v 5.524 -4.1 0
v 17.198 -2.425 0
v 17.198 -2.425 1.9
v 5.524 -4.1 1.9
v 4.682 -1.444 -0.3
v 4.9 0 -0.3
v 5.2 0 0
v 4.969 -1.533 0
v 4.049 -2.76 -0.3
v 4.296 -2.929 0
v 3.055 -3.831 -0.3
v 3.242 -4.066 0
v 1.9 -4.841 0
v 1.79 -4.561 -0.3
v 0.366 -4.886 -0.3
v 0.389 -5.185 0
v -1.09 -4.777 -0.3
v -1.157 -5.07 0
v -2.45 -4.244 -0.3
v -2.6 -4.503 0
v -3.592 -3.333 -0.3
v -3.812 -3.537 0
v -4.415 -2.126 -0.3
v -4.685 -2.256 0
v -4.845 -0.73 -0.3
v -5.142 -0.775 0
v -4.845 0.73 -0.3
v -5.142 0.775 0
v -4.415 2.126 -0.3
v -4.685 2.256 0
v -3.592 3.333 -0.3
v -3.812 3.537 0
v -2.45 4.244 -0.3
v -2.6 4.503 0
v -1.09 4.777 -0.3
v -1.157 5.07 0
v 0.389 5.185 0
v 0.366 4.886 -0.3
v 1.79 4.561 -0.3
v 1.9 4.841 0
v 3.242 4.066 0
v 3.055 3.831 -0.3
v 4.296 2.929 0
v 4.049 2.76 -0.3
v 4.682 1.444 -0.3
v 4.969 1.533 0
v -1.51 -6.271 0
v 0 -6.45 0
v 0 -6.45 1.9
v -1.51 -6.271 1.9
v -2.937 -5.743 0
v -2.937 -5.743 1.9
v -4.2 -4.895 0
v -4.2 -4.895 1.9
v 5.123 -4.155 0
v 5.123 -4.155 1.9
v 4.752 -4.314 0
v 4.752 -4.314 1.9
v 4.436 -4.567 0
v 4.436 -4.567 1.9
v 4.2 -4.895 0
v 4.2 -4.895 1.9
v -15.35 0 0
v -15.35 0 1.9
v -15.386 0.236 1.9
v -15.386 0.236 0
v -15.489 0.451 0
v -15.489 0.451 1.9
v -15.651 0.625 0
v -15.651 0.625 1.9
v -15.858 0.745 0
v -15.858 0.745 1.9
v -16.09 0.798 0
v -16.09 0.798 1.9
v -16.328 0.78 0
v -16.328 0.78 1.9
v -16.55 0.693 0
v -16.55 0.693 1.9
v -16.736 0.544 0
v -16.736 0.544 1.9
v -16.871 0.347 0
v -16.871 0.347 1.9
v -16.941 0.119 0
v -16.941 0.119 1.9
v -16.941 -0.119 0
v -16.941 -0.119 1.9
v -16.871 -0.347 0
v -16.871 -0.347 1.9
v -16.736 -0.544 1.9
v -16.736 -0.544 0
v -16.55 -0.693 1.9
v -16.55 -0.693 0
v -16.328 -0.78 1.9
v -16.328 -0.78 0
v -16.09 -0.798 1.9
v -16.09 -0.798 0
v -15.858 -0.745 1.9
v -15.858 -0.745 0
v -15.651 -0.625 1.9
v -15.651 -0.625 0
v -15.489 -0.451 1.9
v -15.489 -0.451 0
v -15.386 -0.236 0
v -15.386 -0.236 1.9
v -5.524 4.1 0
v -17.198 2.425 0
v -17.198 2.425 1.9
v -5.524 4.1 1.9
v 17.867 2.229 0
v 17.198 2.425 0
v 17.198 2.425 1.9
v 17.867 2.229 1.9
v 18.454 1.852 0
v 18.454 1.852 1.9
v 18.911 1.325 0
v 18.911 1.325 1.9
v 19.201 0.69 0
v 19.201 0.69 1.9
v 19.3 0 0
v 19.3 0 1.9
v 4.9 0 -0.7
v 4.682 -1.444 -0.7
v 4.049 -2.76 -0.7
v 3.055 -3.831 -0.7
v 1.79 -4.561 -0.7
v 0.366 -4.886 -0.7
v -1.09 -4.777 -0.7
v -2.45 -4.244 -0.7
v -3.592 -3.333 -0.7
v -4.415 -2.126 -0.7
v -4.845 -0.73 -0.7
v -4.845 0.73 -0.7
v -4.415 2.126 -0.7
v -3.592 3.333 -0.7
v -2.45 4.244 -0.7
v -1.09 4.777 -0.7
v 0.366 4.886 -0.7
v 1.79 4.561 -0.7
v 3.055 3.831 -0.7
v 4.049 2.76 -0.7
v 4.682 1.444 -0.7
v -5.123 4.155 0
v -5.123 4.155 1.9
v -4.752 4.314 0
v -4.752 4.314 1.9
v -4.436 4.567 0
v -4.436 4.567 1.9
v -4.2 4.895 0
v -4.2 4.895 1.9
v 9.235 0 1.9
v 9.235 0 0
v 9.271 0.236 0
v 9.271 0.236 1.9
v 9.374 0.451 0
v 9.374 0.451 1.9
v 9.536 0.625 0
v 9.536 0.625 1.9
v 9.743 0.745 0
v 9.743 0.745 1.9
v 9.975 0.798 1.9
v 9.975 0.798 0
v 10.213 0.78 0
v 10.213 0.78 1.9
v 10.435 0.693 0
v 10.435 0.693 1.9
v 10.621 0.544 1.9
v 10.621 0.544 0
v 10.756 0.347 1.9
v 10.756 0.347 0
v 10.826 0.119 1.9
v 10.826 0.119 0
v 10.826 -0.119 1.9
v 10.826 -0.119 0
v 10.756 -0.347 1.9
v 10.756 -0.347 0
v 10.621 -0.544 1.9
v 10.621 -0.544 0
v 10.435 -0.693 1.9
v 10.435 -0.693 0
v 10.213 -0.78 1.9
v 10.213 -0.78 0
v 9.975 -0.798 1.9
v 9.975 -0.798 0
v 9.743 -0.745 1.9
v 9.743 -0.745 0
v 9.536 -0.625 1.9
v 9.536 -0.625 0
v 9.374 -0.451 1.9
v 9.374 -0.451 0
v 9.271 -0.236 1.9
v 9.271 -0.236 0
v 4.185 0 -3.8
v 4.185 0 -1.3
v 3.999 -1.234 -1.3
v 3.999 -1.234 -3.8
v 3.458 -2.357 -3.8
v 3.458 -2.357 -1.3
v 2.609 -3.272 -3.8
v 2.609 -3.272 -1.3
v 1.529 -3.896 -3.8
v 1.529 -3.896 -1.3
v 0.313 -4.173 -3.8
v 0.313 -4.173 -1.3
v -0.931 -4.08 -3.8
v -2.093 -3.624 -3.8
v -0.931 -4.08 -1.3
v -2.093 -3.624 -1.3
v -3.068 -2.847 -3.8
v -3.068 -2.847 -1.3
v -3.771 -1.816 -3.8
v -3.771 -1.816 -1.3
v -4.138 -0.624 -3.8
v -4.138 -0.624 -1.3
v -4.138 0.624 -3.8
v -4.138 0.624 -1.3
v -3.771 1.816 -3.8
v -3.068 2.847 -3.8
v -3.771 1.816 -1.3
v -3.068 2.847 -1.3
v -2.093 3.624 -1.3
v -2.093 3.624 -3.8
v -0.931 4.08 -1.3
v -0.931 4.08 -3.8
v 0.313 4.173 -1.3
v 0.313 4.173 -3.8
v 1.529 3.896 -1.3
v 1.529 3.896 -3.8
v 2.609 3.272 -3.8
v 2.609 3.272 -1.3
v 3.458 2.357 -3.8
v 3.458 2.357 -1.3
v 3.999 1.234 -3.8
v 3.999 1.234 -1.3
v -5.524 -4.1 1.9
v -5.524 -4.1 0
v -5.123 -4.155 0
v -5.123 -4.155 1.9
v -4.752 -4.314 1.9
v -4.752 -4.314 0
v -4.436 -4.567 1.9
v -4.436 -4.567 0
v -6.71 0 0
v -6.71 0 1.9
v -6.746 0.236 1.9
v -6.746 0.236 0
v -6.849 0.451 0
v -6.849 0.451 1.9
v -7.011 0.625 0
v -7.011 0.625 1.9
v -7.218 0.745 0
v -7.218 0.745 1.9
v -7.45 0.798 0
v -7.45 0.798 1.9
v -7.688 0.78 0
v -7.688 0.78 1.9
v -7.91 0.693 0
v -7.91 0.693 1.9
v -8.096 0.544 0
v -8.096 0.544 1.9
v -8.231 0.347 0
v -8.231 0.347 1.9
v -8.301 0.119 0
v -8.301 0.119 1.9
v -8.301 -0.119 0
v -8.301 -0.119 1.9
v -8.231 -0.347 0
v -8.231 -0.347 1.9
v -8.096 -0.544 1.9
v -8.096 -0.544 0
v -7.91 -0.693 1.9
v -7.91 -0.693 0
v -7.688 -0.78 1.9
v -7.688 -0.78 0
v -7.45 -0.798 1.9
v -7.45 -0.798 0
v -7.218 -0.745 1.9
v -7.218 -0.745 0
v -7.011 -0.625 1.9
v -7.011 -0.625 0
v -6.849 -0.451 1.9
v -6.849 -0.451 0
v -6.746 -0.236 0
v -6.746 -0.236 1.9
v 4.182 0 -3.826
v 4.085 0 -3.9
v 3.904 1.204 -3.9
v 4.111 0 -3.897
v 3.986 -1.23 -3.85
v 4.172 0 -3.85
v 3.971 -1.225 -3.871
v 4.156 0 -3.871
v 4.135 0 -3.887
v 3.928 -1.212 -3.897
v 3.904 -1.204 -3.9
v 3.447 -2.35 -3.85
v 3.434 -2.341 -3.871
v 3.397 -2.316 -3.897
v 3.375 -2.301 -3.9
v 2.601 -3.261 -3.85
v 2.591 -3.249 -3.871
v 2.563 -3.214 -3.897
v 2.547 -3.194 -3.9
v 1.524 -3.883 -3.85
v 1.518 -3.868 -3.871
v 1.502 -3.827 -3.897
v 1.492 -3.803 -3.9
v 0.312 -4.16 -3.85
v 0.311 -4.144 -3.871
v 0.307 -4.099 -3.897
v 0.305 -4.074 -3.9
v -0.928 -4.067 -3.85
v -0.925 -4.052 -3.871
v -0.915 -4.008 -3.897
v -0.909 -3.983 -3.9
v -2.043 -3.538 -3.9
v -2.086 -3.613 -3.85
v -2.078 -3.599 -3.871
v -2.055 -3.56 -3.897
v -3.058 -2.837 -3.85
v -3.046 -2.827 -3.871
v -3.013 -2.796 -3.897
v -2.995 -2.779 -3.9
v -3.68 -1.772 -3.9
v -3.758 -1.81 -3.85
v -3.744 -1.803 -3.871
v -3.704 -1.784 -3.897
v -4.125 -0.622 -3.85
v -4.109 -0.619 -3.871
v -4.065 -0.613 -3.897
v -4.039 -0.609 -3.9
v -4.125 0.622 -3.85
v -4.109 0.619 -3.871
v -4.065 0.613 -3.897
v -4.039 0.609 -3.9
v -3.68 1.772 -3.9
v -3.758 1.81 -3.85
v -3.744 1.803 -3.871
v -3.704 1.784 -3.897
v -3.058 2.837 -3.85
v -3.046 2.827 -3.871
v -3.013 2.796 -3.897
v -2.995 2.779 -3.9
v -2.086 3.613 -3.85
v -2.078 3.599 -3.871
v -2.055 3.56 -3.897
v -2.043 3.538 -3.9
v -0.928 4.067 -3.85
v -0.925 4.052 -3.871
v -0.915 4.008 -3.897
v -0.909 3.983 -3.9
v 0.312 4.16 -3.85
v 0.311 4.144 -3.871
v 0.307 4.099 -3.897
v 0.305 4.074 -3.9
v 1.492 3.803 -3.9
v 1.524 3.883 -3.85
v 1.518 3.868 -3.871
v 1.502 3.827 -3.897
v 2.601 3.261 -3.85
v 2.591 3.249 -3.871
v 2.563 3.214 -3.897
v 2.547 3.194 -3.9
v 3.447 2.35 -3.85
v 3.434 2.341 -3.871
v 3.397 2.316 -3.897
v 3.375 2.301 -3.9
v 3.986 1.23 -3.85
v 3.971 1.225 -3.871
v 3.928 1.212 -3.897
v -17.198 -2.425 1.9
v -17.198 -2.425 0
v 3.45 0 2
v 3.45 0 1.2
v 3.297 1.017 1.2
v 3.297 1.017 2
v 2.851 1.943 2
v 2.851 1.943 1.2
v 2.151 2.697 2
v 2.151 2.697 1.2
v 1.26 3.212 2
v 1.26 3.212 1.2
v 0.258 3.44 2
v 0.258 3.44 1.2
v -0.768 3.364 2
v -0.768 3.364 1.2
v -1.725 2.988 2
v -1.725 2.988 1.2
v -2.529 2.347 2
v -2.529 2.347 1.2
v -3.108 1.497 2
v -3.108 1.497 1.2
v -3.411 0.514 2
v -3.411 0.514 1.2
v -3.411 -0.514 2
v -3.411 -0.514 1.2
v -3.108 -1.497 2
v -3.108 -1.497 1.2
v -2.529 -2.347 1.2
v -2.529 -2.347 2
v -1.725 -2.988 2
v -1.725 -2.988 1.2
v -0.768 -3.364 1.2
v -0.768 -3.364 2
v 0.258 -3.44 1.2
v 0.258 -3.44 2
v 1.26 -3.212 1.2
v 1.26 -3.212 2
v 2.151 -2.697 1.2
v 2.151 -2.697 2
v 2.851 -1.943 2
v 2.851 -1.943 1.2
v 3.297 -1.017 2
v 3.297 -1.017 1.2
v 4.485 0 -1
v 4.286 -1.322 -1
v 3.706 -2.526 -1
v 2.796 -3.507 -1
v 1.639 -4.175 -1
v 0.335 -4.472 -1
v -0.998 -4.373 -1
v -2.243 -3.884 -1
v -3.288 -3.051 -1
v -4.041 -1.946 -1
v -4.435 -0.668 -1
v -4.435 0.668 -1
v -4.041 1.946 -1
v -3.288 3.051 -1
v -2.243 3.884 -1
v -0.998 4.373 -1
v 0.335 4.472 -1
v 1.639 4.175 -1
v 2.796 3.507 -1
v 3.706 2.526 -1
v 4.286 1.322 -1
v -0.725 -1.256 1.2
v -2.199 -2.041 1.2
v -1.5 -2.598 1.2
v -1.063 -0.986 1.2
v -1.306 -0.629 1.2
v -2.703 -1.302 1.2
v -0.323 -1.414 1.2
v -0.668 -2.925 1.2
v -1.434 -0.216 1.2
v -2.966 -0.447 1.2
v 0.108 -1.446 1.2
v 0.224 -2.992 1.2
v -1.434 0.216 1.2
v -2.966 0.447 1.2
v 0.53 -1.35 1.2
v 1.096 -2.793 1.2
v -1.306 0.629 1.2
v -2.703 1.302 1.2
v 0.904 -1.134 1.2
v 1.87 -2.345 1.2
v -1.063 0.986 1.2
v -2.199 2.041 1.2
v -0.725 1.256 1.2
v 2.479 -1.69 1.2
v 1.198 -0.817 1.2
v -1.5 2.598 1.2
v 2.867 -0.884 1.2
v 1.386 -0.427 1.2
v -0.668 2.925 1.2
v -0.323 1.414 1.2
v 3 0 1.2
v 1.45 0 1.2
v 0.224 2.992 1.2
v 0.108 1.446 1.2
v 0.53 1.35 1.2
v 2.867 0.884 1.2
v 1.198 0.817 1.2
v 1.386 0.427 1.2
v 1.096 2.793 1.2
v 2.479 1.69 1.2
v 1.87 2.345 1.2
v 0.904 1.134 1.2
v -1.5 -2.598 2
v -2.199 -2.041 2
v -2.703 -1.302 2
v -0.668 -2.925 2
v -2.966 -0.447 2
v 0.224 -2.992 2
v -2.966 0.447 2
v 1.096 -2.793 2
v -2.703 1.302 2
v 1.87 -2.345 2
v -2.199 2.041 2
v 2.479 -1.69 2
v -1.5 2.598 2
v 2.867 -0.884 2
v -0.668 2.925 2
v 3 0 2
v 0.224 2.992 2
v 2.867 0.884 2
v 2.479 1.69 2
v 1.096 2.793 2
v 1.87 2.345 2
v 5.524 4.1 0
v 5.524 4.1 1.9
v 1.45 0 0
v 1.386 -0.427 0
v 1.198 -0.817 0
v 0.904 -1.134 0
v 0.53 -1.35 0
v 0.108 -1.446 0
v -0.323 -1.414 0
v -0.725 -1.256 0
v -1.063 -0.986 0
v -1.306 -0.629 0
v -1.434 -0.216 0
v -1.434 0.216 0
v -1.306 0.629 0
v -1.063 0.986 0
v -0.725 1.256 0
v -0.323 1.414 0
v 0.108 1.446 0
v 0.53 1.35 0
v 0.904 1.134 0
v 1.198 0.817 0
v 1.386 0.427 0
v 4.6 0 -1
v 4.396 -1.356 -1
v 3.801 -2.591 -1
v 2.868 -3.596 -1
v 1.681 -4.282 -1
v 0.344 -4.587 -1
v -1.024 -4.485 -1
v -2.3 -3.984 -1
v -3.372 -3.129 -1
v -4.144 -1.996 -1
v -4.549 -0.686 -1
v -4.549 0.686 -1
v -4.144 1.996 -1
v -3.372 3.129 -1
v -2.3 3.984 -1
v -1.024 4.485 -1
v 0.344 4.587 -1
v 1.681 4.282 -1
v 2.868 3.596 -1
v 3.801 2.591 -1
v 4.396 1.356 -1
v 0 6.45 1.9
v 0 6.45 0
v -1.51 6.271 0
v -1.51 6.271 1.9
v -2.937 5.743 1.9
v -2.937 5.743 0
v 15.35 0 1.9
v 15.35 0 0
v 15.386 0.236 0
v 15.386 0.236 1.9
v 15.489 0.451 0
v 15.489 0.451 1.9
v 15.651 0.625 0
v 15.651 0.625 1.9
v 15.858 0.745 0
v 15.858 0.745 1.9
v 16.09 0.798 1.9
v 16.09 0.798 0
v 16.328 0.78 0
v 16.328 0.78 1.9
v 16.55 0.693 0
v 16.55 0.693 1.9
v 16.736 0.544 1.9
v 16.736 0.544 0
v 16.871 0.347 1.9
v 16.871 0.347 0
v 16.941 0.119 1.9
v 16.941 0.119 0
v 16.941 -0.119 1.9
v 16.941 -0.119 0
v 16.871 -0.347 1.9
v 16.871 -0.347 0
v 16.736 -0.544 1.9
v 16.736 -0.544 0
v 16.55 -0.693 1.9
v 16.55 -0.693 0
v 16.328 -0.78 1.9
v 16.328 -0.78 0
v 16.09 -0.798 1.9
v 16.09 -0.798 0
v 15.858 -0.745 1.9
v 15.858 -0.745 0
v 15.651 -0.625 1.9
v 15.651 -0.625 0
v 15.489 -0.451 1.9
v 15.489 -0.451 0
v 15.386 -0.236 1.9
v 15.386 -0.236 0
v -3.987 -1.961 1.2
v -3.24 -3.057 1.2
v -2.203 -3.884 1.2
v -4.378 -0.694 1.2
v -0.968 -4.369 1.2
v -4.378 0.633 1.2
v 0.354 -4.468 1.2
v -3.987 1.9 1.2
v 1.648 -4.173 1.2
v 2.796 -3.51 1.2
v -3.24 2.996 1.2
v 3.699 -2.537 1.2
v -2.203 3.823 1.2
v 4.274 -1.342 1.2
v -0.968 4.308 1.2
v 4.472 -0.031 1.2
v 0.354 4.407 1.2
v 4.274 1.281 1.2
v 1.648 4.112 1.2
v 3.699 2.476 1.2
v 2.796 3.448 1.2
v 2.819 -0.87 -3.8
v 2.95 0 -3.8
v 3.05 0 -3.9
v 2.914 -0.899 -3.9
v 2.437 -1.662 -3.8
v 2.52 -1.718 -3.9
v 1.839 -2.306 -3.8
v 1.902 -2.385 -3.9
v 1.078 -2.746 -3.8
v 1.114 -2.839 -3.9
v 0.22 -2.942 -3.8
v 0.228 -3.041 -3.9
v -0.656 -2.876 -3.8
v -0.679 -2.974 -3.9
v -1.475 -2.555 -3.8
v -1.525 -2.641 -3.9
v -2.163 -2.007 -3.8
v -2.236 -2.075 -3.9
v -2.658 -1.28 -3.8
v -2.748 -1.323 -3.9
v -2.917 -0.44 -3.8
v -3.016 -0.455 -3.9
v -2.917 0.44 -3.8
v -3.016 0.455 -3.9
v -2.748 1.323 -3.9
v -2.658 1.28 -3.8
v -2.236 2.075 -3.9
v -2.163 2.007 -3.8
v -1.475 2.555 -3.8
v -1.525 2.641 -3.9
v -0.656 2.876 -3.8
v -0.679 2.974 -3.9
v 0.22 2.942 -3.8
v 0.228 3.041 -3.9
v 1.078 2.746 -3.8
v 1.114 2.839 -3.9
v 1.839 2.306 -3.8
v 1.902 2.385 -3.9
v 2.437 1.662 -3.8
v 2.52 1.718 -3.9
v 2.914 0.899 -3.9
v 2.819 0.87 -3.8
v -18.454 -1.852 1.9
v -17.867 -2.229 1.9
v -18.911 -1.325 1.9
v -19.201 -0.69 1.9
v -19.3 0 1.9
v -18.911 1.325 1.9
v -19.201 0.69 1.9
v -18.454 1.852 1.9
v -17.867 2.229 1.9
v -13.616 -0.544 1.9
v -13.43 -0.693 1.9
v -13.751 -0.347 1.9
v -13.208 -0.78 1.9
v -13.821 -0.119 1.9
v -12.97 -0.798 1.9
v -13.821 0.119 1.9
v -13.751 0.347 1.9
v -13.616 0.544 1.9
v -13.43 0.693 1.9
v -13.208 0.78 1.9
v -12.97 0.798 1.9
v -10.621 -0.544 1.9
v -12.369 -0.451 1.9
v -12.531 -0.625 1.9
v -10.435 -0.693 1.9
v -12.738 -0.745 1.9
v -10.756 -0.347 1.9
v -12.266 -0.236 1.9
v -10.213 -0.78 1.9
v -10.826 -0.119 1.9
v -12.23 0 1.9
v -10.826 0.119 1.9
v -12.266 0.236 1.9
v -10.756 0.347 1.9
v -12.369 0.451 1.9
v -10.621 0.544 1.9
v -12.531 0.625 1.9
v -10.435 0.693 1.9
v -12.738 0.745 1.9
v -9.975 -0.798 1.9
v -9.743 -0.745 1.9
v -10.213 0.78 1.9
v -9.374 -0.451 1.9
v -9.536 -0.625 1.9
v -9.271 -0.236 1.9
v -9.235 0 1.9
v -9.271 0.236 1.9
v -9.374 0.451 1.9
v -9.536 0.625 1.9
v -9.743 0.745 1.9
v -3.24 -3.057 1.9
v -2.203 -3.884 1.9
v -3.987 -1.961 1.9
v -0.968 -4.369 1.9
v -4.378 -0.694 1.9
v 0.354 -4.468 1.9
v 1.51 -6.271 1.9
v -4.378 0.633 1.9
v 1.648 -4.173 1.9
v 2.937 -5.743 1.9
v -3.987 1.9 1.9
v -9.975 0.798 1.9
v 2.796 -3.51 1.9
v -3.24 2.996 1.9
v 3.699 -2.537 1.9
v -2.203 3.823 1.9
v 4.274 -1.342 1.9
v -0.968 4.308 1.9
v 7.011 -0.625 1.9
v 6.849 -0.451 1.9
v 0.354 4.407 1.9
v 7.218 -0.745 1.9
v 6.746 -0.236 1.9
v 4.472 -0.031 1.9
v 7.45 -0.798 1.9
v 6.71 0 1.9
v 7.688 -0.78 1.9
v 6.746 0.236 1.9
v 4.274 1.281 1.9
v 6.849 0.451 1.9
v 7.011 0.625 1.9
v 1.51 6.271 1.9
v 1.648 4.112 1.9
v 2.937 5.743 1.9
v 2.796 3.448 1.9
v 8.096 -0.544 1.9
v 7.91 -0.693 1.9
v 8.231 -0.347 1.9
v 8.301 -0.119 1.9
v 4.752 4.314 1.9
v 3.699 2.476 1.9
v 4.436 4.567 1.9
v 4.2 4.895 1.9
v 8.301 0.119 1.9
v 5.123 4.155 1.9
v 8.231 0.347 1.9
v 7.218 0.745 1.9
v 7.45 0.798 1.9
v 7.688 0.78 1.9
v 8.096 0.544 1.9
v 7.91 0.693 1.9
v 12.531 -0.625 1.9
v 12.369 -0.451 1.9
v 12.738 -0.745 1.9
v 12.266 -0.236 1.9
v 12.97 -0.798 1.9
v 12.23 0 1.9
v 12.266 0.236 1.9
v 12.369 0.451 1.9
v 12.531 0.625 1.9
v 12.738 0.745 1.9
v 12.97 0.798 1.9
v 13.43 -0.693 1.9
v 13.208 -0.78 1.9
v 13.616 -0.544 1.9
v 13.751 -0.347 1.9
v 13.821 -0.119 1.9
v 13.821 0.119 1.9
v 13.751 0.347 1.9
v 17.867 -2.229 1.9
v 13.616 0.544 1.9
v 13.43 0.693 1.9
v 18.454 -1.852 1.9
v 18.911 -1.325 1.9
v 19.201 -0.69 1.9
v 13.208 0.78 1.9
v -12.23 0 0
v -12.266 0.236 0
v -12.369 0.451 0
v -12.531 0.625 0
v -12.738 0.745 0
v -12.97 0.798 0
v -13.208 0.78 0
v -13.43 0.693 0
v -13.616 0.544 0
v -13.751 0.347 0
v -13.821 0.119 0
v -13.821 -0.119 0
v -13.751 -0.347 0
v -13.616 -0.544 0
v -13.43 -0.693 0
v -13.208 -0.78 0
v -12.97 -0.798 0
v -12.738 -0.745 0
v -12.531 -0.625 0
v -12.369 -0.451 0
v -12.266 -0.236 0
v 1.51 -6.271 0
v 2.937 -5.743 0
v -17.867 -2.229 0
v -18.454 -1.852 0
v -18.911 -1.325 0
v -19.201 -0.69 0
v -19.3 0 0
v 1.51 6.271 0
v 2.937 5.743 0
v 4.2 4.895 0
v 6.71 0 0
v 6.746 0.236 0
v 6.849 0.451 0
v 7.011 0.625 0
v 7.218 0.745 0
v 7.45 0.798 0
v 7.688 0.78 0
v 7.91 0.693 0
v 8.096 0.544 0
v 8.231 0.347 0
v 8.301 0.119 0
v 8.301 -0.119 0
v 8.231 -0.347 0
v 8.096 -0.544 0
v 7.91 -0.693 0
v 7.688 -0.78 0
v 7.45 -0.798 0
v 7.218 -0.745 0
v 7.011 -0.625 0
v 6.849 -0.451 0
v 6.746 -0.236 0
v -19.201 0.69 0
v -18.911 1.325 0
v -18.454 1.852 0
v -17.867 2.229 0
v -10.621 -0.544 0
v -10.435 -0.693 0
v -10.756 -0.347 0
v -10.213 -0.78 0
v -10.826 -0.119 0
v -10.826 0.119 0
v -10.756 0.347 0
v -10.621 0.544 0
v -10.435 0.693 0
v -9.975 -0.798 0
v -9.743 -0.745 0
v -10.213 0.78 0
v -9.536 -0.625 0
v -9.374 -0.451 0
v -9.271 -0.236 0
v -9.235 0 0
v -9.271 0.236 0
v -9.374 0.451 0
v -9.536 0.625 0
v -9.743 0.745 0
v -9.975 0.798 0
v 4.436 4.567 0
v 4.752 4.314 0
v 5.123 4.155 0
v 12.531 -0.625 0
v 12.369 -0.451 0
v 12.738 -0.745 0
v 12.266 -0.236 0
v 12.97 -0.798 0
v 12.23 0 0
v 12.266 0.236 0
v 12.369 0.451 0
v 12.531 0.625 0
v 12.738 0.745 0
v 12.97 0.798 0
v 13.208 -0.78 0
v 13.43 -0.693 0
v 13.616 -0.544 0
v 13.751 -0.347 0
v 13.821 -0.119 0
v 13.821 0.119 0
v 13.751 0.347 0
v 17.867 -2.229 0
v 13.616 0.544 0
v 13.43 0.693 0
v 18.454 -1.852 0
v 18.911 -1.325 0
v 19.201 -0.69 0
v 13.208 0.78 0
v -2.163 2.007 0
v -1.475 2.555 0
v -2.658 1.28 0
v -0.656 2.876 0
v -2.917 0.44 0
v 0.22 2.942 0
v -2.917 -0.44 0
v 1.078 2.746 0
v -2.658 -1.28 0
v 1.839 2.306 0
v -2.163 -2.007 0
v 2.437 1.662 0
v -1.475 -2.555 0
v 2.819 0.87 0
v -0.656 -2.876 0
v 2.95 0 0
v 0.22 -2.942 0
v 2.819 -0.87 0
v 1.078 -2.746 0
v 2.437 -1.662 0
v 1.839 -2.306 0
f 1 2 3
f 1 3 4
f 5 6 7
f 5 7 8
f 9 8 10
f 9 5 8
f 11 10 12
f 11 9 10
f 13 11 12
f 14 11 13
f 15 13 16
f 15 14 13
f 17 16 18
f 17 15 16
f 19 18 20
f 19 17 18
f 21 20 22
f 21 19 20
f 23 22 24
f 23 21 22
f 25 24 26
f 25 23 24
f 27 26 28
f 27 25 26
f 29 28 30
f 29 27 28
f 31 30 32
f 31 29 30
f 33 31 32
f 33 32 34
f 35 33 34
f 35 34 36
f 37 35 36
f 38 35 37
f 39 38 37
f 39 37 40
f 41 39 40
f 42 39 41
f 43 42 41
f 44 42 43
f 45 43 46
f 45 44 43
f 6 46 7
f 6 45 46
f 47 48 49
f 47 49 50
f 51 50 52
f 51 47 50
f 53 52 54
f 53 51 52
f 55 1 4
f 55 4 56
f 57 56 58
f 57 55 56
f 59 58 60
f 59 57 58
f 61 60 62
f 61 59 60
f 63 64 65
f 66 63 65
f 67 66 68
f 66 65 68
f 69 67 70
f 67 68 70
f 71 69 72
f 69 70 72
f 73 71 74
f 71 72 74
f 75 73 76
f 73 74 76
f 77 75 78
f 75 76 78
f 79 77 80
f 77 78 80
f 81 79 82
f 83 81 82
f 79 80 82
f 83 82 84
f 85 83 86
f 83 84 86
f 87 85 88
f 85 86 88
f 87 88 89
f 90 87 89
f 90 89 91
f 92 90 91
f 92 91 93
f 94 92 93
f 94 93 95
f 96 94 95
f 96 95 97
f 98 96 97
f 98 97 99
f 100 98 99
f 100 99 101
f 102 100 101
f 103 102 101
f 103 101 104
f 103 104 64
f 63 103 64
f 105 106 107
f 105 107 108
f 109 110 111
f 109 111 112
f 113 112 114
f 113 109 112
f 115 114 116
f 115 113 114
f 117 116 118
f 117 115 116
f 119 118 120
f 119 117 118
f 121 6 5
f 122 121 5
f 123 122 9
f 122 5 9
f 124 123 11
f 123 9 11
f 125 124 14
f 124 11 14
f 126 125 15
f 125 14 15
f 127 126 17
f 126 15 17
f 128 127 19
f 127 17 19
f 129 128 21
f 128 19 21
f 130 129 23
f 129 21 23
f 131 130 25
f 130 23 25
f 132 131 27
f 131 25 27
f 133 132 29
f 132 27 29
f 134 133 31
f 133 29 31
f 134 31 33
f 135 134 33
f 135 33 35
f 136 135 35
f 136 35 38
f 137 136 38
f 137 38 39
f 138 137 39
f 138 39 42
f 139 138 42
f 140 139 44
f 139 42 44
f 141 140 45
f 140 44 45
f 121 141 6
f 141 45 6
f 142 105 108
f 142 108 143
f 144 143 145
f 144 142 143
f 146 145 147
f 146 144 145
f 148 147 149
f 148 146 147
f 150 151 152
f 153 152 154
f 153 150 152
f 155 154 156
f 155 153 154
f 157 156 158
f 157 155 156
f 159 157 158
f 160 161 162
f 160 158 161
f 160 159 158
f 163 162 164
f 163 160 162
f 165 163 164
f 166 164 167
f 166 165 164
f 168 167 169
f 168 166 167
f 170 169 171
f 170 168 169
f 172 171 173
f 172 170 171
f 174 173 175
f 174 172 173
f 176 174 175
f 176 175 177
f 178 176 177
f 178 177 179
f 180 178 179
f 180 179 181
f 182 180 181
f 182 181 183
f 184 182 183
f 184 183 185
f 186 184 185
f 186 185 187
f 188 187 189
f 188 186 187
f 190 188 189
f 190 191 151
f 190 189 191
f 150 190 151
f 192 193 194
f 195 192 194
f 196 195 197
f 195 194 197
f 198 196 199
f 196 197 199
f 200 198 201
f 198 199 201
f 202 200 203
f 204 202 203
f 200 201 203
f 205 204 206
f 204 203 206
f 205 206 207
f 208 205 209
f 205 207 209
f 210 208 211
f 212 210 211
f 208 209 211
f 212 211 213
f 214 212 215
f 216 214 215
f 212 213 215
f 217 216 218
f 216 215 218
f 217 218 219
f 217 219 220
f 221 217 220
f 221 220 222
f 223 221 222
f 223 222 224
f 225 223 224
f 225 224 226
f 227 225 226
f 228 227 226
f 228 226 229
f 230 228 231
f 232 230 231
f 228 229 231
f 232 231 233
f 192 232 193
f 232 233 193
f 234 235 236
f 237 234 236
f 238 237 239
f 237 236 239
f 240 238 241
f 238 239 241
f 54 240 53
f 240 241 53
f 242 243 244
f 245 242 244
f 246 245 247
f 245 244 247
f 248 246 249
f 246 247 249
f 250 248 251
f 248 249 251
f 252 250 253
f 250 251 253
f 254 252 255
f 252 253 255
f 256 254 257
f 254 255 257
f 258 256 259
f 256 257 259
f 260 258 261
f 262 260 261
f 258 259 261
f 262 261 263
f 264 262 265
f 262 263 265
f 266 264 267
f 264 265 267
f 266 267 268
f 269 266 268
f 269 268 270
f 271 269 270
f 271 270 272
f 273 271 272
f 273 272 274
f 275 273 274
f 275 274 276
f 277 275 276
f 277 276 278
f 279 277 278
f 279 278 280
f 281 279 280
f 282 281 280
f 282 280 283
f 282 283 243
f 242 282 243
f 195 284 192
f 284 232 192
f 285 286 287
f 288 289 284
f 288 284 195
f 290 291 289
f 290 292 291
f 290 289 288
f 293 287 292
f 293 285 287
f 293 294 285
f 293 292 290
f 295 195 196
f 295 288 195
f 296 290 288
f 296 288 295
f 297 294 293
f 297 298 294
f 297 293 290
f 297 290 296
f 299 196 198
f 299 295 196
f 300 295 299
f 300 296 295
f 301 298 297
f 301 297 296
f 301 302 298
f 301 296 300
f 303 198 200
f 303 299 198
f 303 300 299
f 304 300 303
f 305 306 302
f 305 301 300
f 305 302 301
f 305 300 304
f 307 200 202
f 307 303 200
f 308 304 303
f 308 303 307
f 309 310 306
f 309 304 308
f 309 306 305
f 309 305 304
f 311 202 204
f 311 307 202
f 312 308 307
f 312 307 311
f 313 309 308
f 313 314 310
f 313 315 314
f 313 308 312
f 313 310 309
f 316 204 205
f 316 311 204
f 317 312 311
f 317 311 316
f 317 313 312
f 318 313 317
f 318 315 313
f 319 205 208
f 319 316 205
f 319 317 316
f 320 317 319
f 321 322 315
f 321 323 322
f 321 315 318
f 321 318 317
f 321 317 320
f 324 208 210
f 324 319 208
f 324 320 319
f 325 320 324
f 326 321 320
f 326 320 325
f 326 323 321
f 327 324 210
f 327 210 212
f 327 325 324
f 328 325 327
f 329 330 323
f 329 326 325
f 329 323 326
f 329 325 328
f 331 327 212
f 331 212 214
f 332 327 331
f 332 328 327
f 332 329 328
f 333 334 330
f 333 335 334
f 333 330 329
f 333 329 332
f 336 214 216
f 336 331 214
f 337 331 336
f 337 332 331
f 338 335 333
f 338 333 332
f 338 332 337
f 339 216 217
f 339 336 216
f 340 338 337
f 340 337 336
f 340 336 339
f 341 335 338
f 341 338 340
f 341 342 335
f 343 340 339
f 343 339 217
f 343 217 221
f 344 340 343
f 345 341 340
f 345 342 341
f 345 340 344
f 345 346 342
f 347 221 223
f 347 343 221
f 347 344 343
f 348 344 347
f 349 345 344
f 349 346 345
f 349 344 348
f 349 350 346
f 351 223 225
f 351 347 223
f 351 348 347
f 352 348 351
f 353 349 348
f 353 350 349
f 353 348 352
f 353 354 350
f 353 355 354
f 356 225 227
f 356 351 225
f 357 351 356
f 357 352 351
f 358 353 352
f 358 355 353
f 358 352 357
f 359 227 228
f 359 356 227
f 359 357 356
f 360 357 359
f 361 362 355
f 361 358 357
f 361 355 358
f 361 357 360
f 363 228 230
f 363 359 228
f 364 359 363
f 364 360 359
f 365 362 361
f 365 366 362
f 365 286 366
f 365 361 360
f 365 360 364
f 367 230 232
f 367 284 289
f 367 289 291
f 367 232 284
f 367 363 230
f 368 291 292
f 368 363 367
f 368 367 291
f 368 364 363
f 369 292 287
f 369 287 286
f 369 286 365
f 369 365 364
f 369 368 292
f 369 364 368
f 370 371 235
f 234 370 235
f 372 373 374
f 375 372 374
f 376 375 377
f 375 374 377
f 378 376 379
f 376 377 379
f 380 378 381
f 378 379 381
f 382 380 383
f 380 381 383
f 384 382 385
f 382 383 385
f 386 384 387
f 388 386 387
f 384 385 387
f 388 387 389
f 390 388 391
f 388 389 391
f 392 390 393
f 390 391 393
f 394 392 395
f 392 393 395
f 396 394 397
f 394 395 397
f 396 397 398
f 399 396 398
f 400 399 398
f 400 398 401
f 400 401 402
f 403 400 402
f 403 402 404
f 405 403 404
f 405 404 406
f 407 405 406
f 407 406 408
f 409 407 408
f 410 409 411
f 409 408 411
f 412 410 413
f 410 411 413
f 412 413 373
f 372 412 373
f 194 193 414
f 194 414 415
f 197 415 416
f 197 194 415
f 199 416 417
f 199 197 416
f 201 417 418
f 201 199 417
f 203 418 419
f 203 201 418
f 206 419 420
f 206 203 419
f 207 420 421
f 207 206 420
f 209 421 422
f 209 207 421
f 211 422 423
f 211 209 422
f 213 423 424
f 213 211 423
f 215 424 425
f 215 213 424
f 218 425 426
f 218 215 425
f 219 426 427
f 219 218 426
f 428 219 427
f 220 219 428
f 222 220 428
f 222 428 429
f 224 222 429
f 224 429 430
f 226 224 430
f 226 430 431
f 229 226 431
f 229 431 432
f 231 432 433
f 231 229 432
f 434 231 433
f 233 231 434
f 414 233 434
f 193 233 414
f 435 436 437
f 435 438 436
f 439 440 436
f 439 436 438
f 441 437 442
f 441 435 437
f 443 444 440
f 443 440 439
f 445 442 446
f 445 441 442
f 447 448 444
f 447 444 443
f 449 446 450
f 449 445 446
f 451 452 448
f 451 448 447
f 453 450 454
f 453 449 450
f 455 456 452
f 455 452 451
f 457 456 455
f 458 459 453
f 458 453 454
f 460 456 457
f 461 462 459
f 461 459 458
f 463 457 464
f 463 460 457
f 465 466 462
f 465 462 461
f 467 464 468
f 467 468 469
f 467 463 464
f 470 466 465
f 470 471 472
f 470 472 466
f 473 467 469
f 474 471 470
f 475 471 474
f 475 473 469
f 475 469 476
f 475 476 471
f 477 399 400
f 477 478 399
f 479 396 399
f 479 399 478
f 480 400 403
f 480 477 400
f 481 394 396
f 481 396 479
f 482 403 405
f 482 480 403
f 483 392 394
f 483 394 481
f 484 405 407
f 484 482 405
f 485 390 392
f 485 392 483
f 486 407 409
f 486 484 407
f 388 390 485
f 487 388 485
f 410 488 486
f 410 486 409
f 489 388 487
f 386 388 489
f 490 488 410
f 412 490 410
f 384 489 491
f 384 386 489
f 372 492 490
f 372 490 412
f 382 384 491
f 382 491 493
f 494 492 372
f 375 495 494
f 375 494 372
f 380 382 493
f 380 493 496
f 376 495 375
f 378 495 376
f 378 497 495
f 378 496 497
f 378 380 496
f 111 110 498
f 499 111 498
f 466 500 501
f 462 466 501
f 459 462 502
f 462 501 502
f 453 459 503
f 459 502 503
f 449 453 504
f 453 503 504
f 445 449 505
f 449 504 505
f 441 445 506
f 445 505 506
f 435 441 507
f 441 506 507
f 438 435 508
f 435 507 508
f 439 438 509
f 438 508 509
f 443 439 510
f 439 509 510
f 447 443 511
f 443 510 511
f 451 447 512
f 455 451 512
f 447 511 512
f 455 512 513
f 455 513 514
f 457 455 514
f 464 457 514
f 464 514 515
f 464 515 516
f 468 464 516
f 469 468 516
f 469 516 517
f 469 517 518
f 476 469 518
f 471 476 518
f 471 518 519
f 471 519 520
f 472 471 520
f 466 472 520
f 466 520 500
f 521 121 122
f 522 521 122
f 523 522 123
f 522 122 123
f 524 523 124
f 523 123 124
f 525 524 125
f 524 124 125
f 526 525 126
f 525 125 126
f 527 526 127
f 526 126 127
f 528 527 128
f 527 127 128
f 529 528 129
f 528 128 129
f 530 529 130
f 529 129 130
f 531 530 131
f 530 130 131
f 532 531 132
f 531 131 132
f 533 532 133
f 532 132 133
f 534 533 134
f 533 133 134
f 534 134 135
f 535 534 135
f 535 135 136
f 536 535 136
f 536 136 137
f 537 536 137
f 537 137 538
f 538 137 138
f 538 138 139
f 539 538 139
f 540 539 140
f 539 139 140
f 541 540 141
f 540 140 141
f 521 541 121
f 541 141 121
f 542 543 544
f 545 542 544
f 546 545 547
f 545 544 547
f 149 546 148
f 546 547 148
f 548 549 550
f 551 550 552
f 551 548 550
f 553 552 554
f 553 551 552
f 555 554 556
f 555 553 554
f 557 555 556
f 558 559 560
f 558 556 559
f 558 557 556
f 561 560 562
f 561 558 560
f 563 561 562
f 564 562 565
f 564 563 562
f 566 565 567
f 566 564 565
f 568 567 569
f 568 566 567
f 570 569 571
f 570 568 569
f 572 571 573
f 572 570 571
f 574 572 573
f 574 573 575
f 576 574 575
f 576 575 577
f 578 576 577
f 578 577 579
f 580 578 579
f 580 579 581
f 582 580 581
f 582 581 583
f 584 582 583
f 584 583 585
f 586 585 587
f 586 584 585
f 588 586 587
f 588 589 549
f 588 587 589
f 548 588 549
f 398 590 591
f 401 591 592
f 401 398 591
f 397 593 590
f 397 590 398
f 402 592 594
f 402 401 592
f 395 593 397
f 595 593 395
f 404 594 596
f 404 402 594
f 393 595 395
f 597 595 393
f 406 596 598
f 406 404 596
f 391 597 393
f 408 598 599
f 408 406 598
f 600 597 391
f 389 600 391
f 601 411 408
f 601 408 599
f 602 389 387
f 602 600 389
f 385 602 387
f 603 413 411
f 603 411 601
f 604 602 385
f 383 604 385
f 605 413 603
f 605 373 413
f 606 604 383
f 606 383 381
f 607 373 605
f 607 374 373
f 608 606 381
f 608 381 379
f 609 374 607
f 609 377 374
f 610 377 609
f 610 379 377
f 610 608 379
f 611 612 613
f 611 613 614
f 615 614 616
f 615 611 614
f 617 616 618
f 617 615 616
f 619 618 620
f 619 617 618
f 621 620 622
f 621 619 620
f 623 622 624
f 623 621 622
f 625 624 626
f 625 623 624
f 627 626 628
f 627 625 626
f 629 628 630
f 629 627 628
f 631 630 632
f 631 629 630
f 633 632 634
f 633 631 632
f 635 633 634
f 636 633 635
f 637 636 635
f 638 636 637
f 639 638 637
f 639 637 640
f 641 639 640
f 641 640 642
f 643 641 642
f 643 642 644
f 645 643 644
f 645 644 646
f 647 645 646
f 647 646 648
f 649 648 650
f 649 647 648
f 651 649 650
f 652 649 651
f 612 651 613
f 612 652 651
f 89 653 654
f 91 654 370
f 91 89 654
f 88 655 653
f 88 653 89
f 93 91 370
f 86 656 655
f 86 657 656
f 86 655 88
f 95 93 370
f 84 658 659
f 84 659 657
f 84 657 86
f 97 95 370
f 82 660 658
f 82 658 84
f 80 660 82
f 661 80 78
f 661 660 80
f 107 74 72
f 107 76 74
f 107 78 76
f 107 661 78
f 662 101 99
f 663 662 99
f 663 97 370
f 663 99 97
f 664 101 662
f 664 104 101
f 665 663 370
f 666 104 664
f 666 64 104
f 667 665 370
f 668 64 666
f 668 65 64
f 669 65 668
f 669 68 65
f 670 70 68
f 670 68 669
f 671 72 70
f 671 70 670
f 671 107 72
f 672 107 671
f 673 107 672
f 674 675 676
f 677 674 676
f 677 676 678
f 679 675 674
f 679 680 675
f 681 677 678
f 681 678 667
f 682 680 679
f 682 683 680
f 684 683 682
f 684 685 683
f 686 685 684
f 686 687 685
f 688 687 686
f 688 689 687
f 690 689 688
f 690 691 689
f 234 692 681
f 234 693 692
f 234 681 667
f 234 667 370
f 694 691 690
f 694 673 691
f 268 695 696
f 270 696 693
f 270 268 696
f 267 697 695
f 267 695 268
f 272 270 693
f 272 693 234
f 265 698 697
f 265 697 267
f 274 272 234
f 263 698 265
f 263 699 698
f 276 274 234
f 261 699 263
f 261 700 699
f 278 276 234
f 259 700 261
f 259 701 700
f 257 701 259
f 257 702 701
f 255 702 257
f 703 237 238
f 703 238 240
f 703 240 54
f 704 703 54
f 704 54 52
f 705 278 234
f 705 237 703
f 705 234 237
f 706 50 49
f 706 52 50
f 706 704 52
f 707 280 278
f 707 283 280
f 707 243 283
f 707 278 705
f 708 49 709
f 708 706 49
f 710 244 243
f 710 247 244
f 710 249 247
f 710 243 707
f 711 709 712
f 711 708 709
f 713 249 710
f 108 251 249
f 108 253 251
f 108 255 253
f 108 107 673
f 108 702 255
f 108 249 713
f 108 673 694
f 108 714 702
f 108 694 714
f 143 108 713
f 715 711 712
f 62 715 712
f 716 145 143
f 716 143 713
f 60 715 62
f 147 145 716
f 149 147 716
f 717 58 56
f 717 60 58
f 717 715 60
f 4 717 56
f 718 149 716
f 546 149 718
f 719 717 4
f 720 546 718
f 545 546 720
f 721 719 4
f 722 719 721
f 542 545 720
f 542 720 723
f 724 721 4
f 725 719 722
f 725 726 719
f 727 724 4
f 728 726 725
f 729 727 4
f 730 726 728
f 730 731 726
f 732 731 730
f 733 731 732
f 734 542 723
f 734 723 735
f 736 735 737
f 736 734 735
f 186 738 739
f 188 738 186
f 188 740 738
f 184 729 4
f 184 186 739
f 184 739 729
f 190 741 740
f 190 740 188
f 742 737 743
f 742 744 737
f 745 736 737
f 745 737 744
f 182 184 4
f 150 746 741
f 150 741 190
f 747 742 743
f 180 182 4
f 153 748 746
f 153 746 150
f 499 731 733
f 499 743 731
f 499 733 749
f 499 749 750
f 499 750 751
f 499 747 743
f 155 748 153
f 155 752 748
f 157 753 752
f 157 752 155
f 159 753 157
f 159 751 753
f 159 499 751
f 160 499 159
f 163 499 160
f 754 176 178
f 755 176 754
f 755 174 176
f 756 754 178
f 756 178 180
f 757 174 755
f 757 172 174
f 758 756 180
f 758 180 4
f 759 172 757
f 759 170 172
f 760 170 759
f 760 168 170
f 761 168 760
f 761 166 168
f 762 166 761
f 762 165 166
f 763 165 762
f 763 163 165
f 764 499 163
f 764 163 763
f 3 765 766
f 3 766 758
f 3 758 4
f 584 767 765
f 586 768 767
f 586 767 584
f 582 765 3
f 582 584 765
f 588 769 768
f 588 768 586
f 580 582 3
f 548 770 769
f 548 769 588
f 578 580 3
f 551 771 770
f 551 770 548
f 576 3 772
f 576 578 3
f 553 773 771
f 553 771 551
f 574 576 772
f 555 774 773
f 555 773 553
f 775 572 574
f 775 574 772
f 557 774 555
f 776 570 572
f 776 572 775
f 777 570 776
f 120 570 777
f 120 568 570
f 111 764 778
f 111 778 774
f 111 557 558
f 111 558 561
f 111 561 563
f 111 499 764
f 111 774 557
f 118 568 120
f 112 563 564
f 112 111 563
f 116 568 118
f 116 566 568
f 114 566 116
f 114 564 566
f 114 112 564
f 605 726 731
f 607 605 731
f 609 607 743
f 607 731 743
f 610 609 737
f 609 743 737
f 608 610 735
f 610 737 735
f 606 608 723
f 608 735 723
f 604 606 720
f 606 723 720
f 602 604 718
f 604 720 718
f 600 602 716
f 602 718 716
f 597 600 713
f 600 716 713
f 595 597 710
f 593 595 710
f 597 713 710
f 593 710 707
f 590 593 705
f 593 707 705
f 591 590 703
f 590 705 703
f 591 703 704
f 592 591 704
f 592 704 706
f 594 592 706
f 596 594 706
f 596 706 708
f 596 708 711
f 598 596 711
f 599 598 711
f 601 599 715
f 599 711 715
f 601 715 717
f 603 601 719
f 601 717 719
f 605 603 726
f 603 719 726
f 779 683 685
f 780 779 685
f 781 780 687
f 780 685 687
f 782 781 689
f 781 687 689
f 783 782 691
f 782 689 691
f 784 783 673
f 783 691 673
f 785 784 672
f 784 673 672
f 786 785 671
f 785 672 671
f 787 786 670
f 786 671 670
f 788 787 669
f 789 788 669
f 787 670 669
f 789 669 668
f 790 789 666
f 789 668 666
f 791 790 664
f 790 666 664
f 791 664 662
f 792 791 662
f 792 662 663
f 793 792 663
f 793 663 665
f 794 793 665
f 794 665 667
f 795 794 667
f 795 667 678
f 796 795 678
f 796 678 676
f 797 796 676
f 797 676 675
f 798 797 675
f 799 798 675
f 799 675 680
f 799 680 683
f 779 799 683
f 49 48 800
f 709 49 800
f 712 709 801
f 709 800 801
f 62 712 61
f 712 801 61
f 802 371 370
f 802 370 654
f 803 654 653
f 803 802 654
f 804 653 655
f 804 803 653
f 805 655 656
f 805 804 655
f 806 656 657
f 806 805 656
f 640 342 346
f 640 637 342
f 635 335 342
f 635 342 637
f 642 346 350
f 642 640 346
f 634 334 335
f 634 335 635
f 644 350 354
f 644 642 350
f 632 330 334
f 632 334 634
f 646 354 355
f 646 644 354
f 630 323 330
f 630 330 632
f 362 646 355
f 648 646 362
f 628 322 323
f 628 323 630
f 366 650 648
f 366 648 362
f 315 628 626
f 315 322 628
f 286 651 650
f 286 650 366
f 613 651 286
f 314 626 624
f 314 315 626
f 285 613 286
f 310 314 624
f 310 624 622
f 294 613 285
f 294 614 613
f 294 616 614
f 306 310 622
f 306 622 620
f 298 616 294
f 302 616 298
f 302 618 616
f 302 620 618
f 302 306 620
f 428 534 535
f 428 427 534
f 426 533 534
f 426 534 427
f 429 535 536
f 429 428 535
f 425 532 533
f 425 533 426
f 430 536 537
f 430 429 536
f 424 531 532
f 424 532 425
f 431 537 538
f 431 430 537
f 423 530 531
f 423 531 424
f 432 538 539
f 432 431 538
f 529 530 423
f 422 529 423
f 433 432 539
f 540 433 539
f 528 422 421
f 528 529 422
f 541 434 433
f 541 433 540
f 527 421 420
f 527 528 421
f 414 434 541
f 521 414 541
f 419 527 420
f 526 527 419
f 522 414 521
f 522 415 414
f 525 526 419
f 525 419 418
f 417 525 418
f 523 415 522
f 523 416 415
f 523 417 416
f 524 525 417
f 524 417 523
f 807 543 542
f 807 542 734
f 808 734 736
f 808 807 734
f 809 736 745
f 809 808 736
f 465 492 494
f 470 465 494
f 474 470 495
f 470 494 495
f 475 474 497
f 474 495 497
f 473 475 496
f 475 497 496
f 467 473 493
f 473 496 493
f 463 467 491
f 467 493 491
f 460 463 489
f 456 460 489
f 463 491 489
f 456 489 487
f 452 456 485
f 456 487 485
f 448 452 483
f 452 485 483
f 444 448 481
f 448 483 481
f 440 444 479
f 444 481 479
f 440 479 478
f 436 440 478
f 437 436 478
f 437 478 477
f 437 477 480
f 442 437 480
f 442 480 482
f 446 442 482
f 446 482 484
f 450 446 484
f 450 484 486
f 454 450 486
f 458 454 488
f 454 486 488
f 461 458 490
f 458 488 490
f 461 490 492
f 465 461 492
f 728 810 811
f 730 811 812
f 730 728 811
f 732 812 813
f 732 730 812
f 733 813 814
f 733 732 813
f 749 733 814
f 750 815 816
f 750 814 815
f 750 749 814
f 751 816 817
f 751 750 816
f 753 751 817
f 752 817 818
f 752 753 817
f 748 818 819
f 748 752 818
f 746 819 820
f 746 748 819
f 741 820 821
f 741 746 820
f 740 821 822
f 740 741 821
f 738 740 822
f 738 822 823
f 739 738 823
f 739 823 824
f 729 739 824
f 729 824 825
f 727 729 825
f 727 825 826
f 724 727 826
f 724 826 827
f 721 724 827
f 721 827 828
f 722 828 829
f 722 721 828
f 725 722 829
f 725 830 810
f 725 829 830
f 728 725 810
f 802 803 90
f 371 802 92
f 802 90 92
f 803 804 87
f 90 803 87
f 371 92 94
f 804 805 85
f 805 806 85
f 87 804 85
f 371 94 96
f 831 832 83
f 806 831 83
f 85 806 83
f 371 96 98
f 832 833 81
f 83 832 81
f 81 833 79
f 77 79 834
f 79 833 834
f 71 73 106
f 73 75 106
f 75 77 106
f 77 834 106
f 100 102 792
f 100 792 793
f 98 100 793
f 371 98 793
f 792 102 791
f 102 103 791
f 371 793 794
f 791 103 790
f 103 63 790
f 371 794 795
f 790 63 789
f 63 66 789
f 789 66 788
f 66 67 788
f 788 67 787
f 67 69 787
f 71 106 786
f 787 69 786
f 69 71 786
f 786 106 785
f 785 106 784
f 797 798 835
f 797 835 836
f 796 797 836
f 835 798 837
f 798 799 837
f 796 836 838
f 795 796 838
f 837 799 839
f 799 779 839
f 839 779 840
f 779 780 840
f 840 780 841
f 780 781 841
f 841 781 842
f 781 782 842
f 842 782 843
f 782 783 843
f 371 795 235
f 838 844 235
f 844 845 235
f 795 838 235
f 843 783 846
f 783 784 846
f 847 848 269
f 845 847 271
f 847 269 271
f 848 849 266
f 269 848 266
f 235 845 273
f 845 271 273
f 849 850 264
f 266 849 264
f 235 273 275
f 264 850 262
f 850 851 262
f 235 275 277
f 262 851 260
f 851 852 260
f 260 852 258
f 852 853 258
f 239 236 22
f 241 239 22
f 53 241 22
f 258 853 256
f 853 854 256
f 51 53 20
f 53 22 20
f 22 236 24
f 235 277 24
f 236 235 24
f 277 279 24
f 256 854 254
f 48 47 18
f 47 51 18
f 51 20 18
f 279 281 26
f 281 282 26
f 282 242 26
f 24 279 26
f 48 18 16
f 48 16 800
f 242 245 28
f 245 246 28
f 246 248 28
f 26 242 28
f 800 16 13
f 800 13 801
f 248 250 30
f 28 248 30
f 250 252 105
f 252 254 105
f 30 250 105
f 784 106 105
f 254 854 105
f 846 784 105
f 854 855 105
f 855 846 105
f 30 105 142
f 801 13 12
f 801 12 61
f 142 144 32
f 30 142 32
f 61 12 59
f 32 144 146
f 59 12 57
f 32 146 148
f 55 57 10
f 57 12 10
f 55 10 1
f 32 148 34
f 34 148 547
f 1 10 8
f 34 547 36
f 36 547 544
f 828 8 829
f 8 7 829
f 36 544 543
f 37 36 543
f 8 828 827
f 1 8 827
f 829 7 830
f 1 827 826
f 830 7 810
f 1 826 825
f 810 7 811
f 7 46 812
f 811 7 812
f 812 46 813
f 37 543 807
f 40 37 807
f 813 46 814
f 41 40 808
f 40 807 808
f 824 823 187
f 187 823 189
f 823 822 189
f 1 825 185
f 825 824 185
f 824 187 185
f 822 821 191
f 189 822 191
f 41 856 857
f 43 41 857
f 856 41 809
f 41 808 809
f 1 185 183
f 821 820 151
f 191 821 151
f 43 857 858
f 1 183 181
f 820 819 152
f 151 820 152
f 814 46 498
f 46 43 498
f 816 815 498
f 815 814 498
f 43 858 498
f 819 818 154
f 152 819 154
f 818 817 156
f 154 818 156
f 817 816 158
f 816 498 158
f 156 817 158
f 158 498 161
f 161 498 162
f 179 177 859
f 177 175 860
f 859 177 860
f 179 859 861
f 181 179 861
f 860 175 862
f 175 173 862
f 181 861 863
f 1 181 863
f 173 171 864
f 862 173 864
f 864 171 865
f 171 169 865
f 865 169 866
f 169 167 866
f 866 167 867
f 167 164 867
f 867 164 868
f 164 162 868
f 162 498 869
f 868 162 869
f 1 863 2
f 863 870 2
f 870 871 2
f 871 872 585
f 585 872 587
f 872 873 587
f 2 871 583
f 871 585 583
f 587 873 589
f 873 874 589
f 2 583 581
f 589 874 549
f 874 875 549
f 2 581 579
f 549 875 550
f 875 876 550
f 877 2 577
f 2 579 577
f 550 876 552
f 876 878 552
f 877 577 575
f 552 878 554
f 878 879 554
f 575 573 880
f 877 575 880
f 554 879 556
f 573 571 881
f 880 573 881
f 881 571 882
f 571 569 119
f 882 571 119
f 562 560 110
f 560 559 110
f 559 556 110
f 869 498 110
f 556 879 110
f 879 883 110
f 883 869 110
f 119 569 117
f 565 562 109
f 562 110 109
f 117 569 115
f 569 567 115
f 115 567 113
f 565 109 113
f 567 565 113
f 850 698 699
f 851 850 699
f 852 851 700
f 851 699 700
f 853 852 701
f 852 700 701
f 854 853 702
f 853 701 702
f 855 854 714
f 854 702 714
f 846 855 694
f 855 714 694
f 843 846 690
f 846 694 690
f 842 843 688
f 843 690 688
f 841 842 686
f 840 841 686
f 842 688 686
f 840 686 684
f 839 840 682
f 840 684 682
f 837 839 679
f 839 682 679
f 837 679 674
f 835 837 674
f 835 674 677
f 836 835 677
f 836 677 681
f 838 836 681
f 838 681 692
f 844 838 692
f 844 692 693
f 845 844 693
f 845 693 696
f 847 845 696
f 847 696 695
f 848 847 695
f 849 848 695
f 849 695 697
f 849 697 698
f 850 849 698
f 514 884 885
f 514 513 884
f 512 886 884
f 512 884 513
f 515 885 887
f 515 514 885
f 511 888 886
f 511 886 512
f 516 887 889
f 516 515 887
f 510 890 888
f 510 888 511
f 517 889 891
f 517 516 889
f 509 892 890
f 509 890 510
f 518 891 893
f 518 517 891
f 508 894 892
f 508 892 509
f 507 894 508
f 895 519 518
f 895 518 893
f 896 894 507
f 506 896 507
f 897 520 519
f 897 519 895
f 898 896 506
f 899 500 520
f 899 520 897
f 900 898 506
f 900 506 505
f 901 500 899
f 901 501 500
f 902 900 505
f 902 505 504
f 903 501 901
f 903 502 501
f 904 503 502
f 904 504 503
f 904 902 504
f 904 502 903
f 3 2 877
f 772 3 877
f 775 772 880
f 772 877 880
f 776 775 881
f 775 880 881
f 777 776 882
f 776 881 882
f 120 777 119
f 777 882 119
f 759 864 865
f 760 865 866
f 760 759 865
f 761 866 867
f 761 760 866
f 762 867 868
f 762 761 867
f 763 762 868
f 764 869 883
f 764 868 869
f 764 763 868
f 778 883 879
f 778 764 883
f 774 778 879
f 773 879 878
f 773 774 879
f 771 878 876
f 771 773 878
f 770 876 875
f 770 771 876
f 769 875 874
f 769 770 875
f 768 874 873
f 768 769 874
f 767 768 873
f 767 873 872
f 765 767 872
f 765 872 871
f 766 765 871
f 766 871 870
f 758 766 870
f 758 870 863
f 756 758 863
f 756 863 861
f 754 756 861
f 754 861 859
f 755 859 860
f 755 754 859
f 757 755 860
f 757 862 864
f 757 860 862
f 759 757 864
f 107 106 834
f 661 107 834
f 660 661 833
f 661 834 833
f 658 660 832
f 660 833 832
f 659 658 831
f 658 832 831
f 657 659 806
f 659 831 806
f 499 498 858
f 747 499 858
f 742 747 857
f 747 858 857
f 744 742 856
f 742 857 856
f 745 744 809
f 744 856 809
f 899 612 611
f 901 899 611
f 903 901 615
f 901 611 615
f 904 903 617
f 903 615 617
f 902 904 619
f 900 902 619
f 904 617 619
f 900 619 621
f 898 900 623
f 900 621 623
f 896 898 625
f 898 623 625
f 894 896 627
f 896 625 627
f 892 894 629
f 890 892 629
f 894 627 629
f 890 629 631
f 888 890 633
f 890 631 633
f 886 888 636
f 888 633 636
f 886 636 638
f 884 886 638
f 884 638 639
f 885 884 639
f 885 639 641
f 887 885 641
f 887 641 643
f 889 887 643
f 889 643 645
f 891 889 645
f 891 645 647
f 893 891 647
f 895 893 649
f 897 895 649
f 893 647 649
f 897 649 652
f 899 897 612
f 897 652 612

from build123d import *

# Parameters (mm, degrees)
PAD_DEPTH       = 1.9
SKETCH001_R     = 4.45
POCKET_DEPTH    = 0.7
SKETCH002_R     = 3.45
PAD001_DEPTH    = 0.8
SKETCH003_R     = 3
POCKET001_DEPTH = 0.8
SKETCH004_R     = 4.9
PAD002_DEPTH    = 1
SKETCH005_R     = 4.185
PAD003_DEPTH    = 2.9
SKETCH006_R     = 2.95
POCKET002_DEPTH = 3.9
SKETCH007_R     = 1.45
POCKET003_DEPTH = 2.001
CHAMFER_SIZE    = 0.3
CHAMFER001_SIZE = 0.3
CHAMFER002_SIZE = 0.3
SKETCH008_R     = 0.8
POCKET004_DEPTH = 88.048918
FILLET_R        = 0.1
CHAMFER003_SIZE = 0.1


with BuildPart() as horn_top_left_quarter:
    # Sketch → Pad (new body)
    with BuildSketch(Plane.XY):
        with BuildLine():
            ThreePointArc((0, 6.45), (-2.239283, 6.048811), (-4.2, 4.895151))
            ThreePointArc((-5.52408, 4.1), (-4.751834, 4.314062), (-4.2, 4.895151))
            Line((-17.197947, 2.425167), (-5.52408, 4.1))
            ThreePointArc((-17.197947, 2.425167), (-18.701347, 1.604685), (-19.3, 0))
            Line((-19.3, 0), (0, 0))
            Line((0, 6.45), (0, 0))
        make_face()
    extrude(amount=PAD_DEPTH)


with BuildPart() as horn_top_half:
    # Part__Mirroring: instance of horn-top-left-quarter
    add(horn_top_left_quarter.part.mirror(Plane(origin=(0, 0, 0), x_dir=(0, -1, 0), z_dir=(1, 0, 0))))

    # Fusion: union horn-top-left-quarter
    add(horn_top_left_quarter.part)


with BuildPart() as horn_final001:
    # Part__Mirroring001: instance of horn-top-half
    add(horn_top_half.part.mirror(Plane(origin=(0, 0, 0), x_dir=(1, 0, 0), z_dir=(0, 1, 0))))

    # Fusion001: union horn-top-half
    add(horn_top_half.part)

    # Sketch001 → Pocket (cut)
    with BuildSketch(Plane.XY.offset(1.9)):
        with Locations((0.021849, -0.030682)):
            Circle(SKETCH001_R)
    extrude(amount=-POCKET_DEPTH, mode=Mode.SUBTRACT)

    # Sketch002 → Pad001 (new body)
    with BuildSketch(Plane.XY.offset(1.2)):
        Circle(SKETCH002_R)
    extrude(amount=PAD001_DEPTH)

    # Sketch003 → Pocket001 (cut)
    with BuildSketch(Plane.XY.offset(2)):
        Circle(SKETCH003_R)
    extrude(amount=-POCKET001_DEPTH, mode=Mode.SUBTRACT)

    # Sketch004 → Pad002 (new body)
    with BuildSketch(Plane(origin=(0, 0, 0), x_dir=(1, 0, 0), z_dir=(0, 0, -1))):
        Circle(SKETCH004_R)
    extrude(amount=PAD002_DEPTH)

    # Sketch005 → Pad003 (new body)
    with BuildSketch(Plane(origin=(0, 0, -1), x_dir=(1, 0, 0), z_dir=(0, 0, -1))):
        Circle(SKETCH005_R)
    extrude(amount=PAD003_DEPTH)

    # Sketch006 → Pocket002 (cut)
    with BuildSketch(Plane(origin=(0, 0, -3.9), x_dir=(1, 0, 0), z_dir=(0, 0, -1))):
        Circle(SKETCH006_R)
    extrude(amount=-POCKET002_DEPTH, mode=Mode.SUBTRACT)

    # Sketch007 → Pocket003 (cut, through all)
    with BuildSketch(Plane(origin=(0, 0, 0), x_dir=(1, 0, 0), z_dir=(0, 0, -1))):
        Circle(SKETCH007_R)
    extrude(amount=-POCKET003_DEPTH, mode=Mode.SUBTRACT)

    # Chamfer
    chamfer_edges = [horn_final001.edges().sort_by_distance(p)[0] for p in [
        (-4.9, 0, 0),
    ]]
    chamfer(chamfer_edges, length=CHAMFER_SIZE)

    # Chamfer001
    chamfer001_edges = [horn_final001.edges().sort_by_distance(p)[0] for p in [
        (-4.185, 0, -1),
    ]]
    chamfer(chamfer001_edges, length=CHAMFER001_SIZE)

    # Chamfer002
    chamfer002_edges = [horn_final001.edges().sort_by_distance(p)[0] for p in [
        (-4.9, 0, -1),
    ]]
    chamfer(chamfer002_edges, length=CHAMFER002_SIZE)

    # Sketch008 → Pocket004 (cut, through all)
    with BuildSketch(Plane.XY.offset(1.9)):
        with Locations((-16.15, 0)):
            Circle(SKETCH008_R)
        with Locations((-13.03, 0)):
            Circle(SKETCH008_R)
        with Locations((-10.035, 0)):
            Circle(SKETCH008_R)
        with Locations((-7.51, 0)):
            Circle(SKETCH008_R)
    pocket004 = extrude(amount=-POCKET004_DEPTH, mode=Mode.SUBTRACT)

    # Mirrored: Pocket004 across Sketch008 V_Axis
    add(pocket004.mirror(Plane(origin=(0, 0, 1.9), x_dir=(0, 0, 1), z_dir=(1, 0, 0))), mode=Mode.SUBTRACT)

    # Fillet
    fillet_edges = [horn_final001.edges().sort_by_distance(p)[0] for p in [
        (-4.185, 0, -3.9),
    ]]
    fillet(fillet_edges, radius=FILLET_R)

    # Chamfer003
    chamfer003_edges = [horn_final001.edges().sort_by_distance(p)[0] for p in [
        (-2.95, 0, -3.9),
    ]]
    chamfer(chamfer003_edges, length=CHAMFER003_SIZE)


solid = horn_final001.part
